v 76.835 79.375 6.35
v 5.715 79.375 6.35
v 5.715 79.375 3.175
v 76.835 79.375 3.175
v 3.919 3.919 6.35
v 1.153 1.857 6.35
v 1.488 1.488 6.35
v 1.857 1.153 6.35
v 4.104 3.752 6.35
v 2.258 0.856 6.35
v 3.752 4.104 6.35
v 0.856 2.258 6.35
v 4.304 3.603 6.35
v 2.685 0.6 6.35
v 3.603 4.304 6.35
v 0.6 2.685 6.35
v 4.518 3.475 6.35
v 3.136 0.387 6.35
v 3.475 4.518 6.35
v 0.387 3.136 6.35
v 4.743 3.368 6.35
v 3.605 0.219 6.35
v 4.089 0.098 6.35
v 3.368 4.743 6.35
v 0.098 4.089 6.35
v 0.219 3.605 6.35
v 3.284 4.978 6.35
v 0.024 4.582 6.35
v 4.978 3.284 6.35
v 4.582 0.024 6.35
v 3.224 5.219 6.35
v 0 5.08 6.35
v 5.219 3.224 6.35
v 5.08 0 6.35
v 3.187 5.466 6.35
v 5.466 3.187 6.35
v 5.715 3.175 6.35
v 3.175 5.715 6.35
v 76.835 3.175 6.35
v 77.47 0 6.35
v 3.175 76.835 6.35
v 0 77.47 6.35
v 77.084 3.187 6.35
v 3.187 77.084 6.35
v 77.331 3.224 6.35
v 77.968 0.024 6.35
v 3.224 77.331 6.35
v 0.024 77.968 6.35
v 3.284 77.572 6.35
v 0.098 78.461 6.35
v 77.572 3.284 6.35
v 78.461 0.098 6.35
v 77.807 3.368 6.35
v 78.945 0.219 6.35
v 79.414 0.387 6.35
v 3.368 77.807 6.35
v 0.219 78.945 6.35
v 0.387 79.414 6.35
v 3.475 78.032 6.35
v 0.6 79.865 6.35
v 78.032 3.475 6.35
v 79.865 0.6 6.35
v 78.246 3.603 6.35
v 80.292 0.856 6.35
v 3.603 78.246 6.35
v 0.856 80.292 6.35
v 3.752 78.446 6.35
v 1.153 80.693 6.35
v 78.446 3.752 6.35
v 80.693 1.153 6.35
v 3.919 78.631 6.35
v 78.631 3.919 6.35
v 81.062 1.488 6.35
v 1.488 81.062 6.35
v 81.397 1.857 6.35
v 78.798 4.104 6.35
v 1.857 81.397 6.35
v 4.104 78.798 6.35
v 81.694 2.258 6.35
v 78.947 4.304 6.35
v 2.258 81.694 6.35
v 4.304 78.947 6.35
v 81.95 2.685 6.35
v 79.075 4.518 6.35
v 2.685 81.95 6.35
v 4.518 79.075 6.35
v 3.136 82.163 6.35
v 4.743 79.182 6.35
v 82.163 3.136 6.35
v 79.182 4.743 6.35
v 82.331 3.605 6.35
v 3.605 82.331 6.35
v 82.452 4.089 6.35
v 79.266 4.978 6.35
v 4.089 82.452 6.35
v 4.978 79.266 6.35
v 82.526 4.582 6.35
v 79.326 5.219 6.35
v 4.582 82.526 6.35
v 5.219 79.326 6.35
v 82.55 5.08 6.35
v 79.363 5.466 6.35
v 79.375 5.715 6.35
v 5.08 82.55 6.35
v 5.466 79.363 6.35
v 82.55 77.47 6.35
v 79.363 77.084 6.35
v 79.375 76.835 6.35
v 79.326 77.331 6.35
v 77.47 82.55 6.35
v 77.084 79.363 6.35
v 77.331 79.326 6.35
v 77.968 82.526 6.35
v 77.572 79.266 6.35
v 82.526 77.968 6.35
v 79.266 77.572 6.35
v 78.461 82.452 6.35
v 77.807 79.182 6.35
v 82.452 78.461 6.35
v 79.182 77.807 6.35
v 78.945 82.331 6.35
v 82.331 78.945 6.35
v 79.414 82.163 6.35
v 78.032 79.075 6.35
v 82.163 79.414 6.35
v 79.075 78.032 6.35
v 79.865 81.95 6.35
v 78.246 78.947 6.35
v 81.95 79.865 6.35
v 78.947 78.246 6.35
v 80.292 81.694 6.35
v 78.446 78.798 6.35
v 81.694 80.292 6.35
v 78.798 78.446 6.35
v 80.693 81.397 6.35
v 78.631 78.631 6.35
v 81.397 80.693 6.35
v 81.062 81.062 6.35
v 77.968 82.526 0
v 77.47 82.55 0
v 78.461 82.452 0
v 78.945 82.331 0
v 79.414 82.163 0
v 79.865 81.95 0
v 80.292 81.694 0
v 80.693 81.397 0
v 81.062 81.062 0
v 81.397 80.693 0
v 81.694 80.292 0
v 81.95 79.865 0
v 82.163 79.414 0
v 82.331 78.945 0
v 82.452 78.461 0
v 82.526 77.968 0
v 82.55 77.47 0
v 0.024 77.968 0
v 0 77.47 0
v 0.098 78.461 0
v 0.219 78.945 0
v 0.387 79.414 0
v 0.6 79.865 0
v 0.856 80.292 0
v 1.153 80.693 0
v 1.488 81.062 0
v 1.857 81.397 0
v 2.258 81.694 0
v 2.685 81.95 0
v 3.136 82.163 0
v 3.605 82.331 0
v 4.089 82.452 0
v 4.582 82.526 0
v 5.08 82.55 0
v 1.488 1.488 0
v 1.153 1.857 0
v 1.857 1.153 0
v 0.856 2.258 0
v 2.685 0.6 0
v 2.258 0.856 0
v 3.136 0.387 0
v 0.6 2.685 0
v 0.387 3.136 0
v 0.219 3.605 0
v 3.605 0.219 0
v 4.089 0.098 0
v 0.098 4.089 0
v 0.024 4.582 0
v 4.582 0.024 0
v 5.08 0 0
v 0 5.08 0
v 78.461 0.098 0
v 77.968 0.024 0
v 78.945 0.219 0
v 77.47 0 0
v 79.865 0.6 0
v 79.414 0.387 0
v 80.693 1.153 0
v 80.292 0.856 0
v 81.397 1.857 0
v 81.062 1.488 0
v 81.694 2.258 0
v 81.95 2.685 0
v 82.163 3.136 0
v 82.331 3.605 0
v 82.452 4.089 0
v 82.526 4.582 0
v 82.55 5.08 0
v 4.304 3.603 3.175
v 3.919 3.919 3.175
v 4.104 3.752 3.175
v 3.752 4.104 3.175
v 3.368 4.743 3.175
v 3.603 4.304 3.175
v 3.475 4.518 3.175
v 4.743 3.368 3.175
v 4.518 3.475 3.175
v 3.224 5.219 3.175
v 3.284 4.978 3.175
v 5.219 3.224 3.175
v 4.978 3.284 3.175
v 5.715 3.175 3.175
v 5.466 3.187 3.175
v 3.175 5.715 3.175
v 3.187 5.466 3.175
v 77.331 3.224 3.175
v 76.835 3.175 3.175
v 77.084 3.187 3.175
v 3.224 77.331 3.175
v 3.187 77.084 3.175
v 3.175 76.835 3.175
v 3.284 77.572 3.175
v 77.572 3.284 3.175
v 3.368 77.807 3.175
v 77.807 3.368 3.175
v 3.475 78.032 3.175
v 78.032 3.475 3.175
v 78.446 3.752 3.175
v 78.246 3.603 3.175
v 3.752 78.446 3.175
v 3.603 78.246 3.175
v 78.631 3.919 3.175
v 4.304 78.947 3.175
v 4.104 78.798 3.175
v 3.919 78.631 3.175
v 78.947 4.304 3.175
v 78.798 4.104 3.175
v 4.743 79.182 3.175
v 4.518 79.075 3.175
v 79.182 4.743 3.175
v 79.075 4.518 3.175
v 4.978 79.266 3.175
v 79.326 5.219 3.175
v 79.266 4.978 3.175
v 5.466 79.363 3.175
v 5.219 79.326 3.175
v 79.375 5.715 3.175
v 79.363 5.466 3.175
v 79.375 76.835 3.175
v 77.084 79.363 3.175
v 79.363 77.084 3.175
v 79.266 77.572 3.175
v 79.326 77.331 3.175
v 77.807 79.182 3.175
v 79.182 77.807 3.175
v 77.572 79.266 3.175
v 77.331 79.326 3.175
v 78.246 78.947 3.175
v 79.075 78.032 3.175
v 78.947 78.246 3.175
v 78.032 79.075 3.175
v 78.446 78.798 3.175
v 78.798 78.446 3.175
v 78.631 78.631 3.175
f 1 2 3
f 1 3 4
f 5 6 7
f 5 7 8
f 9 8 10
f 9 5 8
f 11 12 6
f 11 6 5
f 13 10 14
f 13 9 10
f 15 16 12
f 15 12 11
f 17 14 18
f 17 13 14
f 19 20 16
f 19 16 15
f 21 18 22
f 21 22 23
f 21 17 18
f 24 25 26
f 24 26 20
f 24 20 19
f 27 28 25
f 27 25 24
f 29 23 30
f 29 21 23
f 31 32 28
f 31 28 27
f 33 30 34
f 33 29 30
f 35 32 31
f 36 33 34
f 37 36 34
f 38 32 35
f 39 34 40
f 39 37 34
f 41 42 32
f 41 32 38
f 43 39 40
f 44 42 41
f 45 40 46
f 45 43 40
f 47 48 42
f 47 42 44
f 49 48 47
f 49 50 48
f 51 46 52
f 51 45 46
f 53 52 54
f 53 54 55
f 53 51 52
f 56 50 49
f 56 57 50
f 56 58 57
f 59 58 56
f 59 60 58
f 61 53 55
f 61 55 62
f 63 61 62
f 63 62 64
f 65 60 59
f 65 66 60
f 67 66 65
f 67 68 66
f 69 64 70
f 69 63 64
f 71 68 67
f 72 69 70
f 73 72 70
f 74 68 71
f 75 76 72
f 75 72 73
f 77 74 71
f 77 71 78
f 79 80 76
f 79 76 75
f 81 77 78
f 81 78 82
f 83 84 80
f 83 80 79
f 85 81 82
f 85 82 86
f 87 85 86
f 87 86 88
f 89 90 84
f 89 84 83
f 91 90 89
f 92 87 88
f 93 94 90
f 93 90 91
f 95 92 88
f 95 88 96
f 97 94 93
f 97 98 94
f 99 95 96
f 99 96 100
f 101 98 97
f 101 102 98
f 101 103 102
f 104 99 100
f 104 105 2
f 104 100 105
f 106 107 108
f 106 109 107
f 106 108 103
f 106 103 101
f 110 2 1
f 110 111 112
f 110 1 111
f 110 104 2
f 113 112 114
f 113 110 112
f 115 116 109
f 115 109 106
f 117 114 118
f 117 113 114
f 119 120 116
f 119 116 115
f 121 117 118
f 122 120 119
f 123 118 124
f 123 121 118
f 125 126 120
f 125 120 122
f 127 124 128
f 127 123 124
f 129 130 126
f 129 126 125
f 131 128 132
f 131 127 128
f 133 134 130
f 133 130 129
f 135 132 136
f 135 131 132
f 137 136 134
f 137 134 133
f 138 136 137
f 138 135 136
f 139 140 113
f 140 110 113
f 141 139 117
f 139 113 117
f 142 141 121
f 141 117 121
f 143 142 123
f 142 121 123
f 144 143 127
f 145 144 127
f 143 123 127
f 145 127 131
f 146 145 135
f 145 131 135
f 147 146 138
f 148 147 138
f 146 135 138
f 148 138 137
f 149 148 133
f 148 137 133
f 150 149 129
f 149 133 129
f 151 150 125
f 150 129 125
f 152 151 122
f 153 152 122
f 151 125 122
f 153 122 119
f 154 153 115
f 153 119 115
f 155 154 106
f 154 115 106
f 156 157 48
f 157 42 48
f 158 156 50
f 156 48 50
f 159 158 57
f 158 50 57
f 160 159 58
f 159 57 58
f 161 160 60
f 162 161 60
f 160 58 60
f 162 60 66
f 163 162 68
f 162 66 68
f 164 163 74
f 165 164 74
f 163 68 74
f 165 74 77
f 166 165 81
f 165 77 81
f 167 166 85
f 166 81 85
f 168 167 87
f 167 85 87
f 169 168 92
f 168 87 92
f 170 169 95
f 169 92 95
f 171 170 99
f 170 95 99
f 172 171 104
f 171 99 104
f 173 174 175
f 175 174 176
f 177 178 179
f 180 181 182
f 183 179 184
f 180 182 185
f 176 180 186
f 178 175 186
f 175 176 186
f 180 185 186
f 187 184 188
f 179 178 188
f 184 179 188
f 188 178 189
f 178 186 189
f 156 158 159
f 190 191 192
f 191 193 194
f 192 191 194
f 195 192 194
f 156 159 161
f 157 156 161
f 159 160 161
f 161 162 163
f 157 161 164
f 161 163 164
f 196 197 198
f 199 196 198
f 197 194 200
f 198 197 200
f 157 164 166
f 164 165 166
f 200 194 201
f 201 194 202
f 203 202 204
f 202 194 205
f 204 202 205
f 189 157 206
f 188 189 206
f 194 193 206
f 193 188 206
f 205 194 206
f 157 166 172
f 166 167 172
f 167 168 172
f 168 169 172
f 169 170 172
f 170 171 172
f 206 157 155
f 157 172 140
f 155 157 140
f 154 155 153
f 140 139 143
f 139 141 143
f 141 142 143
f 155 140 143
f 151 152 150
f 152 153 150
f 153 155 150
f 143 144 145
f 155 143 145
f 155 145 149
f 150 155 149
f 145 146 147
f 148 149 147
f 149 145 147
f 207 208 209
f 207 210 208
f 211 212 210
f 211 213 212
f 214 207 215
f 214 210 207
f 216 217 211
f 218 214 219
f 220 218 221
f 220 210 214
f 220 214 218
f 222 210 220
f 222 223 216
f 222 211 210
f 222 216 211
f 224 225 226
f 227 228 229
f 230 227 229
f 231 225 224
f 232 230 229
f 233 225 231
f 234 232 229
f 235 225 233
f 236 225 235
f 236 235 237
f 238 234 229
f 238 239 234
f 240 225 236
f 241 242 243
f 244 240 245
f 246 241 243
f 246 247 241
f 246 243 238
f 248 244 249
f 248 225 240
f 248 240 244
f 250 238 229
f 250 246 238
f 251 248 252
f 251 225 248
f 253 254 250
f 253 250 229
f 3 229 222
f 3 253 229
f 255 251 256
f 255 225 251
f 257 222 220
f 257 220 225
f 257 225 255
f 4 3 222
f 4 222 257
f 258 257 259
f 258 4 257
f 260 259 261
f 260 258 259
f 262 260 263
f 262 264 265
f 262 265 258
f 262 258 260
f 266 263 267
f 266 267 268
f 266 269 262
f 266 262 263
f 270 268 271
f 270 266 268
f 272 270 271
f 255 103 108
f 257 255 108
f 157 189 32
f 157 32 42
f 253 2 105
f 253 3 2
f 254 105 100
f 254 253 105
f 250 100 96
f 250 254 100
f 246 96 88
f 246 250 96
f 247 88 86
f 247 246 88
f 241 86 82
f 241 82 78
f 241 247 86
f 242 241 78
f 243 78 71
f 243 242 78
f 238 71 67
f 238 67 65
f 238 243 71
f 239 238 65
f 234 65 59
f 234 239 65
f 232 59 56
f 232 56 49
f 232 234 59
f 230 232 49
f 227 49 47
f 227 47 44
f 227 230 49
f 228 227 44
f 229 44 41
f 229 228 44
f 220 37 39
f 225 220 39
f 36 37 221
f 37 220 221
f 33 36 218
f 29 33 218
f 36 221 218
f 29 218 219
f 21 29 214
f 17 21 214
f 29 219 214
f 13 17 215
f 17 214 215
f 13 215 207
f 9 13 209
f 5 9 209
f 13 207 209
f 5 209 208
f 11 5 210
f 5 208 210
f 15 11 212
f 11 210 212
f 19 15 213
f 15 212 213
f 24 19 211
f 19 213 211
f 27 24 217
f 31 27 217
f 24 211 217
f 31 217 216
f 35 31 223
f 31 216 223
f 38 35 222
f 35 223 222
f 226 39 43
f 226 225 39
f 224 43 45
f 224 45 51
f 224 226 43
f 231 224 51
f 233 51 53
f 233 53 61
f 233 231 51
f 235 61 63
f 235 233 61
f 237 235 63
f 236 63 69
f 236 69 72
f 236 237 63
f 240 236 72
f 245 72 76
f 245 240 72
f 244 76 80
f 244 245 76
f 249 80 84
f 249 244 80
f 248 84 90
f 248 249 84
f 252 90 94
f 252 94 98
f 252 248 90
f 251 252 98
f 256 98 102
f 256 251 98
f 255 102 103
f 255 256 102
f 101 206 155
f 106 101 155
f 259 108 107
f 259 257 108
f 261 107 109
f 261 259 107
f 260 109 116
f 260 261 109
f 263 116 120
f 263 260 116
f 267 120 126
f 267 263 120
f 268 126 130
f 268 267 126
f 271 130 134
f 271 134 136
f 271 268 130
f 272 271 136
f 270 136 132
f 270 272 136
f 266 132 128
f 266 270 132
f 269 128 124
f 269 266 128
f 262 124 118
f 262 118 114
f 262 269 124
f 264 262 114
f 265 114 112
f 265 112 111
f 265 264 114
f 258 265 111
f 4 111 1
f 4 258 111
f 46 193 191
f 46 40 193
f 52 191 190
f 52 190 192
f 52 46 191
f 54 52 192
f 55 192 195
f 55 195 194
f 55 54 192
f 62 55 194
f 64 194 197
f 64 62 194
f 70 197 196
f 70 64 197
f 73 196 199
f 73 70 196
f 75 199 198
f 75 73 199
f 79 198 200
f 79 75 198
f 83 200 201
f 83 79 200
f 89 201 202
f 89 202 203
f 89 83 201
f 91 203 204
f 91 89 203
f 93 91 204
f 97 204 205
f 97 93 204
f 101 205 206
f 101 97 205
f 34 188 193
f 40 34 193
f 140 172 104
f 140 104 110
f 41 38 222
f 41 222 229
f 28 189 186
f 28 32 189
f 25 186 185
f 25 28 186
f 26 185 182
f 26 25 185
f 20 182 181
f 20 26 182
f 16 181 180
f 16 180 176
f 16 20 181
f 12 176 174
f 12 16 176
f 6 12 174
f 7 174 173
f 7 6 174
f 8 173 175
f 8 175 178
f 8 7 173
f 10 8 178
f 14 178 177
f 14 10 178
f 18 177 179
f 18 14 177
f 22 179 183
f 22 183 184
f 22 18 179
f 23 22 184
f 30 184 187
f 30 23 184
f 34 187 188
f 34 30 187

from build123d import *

# Parameters (mm, degrees)
F0_W     = 82.55
F0_H     = 82.55
F1_DEPTH = 6.35
F2_W     = 76.2
F2_H     = 76.2
F3_DEPTH = 3.175
F4_R     = 5.08
F5_R     = 2.54


with BuildPart() as f1:
    # F0 (on Top) → F1 (new body)
    with BuildSketch(Plane.XY):
        with Locations((41.275, 41.275)):
            Rectangle(F0_W, F0_H)
    extrude(amount=F1_DEPTH)

    # F2 (on face) → F3 (cut)
    with BuildSketch(Plane.XY.offset(6.35)):
        with Locations((41.275, 41.275)):
            Rectangle(F2_W, F2_H)
    extrude(amount=-F3_DEPTH, mode=Mode.SUBTRACT)

    # F4
    f4_edges = [f1.edges().sort_by_distance(p)[0] for p in [
        (0, 0, 3.175),
        (82.55, 0, 3.175),
        (82.55, 82.55, 3.175),
        (0, 82.55, 3.175),
    ]]
    fillet(f4_edges, radius=F4_R)

    # F5
    f5_edges = [f1.edges().sort_by_distance(p)[0] for p in [
        (79.375, 3.175, 4.7625),
        (3.175, 3.175, 4.7625),
        (3.175, 79.375, 4.7625),
        (79.375, 79.375, 4.7625),
    ]]
    fillet(f5_edges, radius=F5_R)


solid = f1.part
